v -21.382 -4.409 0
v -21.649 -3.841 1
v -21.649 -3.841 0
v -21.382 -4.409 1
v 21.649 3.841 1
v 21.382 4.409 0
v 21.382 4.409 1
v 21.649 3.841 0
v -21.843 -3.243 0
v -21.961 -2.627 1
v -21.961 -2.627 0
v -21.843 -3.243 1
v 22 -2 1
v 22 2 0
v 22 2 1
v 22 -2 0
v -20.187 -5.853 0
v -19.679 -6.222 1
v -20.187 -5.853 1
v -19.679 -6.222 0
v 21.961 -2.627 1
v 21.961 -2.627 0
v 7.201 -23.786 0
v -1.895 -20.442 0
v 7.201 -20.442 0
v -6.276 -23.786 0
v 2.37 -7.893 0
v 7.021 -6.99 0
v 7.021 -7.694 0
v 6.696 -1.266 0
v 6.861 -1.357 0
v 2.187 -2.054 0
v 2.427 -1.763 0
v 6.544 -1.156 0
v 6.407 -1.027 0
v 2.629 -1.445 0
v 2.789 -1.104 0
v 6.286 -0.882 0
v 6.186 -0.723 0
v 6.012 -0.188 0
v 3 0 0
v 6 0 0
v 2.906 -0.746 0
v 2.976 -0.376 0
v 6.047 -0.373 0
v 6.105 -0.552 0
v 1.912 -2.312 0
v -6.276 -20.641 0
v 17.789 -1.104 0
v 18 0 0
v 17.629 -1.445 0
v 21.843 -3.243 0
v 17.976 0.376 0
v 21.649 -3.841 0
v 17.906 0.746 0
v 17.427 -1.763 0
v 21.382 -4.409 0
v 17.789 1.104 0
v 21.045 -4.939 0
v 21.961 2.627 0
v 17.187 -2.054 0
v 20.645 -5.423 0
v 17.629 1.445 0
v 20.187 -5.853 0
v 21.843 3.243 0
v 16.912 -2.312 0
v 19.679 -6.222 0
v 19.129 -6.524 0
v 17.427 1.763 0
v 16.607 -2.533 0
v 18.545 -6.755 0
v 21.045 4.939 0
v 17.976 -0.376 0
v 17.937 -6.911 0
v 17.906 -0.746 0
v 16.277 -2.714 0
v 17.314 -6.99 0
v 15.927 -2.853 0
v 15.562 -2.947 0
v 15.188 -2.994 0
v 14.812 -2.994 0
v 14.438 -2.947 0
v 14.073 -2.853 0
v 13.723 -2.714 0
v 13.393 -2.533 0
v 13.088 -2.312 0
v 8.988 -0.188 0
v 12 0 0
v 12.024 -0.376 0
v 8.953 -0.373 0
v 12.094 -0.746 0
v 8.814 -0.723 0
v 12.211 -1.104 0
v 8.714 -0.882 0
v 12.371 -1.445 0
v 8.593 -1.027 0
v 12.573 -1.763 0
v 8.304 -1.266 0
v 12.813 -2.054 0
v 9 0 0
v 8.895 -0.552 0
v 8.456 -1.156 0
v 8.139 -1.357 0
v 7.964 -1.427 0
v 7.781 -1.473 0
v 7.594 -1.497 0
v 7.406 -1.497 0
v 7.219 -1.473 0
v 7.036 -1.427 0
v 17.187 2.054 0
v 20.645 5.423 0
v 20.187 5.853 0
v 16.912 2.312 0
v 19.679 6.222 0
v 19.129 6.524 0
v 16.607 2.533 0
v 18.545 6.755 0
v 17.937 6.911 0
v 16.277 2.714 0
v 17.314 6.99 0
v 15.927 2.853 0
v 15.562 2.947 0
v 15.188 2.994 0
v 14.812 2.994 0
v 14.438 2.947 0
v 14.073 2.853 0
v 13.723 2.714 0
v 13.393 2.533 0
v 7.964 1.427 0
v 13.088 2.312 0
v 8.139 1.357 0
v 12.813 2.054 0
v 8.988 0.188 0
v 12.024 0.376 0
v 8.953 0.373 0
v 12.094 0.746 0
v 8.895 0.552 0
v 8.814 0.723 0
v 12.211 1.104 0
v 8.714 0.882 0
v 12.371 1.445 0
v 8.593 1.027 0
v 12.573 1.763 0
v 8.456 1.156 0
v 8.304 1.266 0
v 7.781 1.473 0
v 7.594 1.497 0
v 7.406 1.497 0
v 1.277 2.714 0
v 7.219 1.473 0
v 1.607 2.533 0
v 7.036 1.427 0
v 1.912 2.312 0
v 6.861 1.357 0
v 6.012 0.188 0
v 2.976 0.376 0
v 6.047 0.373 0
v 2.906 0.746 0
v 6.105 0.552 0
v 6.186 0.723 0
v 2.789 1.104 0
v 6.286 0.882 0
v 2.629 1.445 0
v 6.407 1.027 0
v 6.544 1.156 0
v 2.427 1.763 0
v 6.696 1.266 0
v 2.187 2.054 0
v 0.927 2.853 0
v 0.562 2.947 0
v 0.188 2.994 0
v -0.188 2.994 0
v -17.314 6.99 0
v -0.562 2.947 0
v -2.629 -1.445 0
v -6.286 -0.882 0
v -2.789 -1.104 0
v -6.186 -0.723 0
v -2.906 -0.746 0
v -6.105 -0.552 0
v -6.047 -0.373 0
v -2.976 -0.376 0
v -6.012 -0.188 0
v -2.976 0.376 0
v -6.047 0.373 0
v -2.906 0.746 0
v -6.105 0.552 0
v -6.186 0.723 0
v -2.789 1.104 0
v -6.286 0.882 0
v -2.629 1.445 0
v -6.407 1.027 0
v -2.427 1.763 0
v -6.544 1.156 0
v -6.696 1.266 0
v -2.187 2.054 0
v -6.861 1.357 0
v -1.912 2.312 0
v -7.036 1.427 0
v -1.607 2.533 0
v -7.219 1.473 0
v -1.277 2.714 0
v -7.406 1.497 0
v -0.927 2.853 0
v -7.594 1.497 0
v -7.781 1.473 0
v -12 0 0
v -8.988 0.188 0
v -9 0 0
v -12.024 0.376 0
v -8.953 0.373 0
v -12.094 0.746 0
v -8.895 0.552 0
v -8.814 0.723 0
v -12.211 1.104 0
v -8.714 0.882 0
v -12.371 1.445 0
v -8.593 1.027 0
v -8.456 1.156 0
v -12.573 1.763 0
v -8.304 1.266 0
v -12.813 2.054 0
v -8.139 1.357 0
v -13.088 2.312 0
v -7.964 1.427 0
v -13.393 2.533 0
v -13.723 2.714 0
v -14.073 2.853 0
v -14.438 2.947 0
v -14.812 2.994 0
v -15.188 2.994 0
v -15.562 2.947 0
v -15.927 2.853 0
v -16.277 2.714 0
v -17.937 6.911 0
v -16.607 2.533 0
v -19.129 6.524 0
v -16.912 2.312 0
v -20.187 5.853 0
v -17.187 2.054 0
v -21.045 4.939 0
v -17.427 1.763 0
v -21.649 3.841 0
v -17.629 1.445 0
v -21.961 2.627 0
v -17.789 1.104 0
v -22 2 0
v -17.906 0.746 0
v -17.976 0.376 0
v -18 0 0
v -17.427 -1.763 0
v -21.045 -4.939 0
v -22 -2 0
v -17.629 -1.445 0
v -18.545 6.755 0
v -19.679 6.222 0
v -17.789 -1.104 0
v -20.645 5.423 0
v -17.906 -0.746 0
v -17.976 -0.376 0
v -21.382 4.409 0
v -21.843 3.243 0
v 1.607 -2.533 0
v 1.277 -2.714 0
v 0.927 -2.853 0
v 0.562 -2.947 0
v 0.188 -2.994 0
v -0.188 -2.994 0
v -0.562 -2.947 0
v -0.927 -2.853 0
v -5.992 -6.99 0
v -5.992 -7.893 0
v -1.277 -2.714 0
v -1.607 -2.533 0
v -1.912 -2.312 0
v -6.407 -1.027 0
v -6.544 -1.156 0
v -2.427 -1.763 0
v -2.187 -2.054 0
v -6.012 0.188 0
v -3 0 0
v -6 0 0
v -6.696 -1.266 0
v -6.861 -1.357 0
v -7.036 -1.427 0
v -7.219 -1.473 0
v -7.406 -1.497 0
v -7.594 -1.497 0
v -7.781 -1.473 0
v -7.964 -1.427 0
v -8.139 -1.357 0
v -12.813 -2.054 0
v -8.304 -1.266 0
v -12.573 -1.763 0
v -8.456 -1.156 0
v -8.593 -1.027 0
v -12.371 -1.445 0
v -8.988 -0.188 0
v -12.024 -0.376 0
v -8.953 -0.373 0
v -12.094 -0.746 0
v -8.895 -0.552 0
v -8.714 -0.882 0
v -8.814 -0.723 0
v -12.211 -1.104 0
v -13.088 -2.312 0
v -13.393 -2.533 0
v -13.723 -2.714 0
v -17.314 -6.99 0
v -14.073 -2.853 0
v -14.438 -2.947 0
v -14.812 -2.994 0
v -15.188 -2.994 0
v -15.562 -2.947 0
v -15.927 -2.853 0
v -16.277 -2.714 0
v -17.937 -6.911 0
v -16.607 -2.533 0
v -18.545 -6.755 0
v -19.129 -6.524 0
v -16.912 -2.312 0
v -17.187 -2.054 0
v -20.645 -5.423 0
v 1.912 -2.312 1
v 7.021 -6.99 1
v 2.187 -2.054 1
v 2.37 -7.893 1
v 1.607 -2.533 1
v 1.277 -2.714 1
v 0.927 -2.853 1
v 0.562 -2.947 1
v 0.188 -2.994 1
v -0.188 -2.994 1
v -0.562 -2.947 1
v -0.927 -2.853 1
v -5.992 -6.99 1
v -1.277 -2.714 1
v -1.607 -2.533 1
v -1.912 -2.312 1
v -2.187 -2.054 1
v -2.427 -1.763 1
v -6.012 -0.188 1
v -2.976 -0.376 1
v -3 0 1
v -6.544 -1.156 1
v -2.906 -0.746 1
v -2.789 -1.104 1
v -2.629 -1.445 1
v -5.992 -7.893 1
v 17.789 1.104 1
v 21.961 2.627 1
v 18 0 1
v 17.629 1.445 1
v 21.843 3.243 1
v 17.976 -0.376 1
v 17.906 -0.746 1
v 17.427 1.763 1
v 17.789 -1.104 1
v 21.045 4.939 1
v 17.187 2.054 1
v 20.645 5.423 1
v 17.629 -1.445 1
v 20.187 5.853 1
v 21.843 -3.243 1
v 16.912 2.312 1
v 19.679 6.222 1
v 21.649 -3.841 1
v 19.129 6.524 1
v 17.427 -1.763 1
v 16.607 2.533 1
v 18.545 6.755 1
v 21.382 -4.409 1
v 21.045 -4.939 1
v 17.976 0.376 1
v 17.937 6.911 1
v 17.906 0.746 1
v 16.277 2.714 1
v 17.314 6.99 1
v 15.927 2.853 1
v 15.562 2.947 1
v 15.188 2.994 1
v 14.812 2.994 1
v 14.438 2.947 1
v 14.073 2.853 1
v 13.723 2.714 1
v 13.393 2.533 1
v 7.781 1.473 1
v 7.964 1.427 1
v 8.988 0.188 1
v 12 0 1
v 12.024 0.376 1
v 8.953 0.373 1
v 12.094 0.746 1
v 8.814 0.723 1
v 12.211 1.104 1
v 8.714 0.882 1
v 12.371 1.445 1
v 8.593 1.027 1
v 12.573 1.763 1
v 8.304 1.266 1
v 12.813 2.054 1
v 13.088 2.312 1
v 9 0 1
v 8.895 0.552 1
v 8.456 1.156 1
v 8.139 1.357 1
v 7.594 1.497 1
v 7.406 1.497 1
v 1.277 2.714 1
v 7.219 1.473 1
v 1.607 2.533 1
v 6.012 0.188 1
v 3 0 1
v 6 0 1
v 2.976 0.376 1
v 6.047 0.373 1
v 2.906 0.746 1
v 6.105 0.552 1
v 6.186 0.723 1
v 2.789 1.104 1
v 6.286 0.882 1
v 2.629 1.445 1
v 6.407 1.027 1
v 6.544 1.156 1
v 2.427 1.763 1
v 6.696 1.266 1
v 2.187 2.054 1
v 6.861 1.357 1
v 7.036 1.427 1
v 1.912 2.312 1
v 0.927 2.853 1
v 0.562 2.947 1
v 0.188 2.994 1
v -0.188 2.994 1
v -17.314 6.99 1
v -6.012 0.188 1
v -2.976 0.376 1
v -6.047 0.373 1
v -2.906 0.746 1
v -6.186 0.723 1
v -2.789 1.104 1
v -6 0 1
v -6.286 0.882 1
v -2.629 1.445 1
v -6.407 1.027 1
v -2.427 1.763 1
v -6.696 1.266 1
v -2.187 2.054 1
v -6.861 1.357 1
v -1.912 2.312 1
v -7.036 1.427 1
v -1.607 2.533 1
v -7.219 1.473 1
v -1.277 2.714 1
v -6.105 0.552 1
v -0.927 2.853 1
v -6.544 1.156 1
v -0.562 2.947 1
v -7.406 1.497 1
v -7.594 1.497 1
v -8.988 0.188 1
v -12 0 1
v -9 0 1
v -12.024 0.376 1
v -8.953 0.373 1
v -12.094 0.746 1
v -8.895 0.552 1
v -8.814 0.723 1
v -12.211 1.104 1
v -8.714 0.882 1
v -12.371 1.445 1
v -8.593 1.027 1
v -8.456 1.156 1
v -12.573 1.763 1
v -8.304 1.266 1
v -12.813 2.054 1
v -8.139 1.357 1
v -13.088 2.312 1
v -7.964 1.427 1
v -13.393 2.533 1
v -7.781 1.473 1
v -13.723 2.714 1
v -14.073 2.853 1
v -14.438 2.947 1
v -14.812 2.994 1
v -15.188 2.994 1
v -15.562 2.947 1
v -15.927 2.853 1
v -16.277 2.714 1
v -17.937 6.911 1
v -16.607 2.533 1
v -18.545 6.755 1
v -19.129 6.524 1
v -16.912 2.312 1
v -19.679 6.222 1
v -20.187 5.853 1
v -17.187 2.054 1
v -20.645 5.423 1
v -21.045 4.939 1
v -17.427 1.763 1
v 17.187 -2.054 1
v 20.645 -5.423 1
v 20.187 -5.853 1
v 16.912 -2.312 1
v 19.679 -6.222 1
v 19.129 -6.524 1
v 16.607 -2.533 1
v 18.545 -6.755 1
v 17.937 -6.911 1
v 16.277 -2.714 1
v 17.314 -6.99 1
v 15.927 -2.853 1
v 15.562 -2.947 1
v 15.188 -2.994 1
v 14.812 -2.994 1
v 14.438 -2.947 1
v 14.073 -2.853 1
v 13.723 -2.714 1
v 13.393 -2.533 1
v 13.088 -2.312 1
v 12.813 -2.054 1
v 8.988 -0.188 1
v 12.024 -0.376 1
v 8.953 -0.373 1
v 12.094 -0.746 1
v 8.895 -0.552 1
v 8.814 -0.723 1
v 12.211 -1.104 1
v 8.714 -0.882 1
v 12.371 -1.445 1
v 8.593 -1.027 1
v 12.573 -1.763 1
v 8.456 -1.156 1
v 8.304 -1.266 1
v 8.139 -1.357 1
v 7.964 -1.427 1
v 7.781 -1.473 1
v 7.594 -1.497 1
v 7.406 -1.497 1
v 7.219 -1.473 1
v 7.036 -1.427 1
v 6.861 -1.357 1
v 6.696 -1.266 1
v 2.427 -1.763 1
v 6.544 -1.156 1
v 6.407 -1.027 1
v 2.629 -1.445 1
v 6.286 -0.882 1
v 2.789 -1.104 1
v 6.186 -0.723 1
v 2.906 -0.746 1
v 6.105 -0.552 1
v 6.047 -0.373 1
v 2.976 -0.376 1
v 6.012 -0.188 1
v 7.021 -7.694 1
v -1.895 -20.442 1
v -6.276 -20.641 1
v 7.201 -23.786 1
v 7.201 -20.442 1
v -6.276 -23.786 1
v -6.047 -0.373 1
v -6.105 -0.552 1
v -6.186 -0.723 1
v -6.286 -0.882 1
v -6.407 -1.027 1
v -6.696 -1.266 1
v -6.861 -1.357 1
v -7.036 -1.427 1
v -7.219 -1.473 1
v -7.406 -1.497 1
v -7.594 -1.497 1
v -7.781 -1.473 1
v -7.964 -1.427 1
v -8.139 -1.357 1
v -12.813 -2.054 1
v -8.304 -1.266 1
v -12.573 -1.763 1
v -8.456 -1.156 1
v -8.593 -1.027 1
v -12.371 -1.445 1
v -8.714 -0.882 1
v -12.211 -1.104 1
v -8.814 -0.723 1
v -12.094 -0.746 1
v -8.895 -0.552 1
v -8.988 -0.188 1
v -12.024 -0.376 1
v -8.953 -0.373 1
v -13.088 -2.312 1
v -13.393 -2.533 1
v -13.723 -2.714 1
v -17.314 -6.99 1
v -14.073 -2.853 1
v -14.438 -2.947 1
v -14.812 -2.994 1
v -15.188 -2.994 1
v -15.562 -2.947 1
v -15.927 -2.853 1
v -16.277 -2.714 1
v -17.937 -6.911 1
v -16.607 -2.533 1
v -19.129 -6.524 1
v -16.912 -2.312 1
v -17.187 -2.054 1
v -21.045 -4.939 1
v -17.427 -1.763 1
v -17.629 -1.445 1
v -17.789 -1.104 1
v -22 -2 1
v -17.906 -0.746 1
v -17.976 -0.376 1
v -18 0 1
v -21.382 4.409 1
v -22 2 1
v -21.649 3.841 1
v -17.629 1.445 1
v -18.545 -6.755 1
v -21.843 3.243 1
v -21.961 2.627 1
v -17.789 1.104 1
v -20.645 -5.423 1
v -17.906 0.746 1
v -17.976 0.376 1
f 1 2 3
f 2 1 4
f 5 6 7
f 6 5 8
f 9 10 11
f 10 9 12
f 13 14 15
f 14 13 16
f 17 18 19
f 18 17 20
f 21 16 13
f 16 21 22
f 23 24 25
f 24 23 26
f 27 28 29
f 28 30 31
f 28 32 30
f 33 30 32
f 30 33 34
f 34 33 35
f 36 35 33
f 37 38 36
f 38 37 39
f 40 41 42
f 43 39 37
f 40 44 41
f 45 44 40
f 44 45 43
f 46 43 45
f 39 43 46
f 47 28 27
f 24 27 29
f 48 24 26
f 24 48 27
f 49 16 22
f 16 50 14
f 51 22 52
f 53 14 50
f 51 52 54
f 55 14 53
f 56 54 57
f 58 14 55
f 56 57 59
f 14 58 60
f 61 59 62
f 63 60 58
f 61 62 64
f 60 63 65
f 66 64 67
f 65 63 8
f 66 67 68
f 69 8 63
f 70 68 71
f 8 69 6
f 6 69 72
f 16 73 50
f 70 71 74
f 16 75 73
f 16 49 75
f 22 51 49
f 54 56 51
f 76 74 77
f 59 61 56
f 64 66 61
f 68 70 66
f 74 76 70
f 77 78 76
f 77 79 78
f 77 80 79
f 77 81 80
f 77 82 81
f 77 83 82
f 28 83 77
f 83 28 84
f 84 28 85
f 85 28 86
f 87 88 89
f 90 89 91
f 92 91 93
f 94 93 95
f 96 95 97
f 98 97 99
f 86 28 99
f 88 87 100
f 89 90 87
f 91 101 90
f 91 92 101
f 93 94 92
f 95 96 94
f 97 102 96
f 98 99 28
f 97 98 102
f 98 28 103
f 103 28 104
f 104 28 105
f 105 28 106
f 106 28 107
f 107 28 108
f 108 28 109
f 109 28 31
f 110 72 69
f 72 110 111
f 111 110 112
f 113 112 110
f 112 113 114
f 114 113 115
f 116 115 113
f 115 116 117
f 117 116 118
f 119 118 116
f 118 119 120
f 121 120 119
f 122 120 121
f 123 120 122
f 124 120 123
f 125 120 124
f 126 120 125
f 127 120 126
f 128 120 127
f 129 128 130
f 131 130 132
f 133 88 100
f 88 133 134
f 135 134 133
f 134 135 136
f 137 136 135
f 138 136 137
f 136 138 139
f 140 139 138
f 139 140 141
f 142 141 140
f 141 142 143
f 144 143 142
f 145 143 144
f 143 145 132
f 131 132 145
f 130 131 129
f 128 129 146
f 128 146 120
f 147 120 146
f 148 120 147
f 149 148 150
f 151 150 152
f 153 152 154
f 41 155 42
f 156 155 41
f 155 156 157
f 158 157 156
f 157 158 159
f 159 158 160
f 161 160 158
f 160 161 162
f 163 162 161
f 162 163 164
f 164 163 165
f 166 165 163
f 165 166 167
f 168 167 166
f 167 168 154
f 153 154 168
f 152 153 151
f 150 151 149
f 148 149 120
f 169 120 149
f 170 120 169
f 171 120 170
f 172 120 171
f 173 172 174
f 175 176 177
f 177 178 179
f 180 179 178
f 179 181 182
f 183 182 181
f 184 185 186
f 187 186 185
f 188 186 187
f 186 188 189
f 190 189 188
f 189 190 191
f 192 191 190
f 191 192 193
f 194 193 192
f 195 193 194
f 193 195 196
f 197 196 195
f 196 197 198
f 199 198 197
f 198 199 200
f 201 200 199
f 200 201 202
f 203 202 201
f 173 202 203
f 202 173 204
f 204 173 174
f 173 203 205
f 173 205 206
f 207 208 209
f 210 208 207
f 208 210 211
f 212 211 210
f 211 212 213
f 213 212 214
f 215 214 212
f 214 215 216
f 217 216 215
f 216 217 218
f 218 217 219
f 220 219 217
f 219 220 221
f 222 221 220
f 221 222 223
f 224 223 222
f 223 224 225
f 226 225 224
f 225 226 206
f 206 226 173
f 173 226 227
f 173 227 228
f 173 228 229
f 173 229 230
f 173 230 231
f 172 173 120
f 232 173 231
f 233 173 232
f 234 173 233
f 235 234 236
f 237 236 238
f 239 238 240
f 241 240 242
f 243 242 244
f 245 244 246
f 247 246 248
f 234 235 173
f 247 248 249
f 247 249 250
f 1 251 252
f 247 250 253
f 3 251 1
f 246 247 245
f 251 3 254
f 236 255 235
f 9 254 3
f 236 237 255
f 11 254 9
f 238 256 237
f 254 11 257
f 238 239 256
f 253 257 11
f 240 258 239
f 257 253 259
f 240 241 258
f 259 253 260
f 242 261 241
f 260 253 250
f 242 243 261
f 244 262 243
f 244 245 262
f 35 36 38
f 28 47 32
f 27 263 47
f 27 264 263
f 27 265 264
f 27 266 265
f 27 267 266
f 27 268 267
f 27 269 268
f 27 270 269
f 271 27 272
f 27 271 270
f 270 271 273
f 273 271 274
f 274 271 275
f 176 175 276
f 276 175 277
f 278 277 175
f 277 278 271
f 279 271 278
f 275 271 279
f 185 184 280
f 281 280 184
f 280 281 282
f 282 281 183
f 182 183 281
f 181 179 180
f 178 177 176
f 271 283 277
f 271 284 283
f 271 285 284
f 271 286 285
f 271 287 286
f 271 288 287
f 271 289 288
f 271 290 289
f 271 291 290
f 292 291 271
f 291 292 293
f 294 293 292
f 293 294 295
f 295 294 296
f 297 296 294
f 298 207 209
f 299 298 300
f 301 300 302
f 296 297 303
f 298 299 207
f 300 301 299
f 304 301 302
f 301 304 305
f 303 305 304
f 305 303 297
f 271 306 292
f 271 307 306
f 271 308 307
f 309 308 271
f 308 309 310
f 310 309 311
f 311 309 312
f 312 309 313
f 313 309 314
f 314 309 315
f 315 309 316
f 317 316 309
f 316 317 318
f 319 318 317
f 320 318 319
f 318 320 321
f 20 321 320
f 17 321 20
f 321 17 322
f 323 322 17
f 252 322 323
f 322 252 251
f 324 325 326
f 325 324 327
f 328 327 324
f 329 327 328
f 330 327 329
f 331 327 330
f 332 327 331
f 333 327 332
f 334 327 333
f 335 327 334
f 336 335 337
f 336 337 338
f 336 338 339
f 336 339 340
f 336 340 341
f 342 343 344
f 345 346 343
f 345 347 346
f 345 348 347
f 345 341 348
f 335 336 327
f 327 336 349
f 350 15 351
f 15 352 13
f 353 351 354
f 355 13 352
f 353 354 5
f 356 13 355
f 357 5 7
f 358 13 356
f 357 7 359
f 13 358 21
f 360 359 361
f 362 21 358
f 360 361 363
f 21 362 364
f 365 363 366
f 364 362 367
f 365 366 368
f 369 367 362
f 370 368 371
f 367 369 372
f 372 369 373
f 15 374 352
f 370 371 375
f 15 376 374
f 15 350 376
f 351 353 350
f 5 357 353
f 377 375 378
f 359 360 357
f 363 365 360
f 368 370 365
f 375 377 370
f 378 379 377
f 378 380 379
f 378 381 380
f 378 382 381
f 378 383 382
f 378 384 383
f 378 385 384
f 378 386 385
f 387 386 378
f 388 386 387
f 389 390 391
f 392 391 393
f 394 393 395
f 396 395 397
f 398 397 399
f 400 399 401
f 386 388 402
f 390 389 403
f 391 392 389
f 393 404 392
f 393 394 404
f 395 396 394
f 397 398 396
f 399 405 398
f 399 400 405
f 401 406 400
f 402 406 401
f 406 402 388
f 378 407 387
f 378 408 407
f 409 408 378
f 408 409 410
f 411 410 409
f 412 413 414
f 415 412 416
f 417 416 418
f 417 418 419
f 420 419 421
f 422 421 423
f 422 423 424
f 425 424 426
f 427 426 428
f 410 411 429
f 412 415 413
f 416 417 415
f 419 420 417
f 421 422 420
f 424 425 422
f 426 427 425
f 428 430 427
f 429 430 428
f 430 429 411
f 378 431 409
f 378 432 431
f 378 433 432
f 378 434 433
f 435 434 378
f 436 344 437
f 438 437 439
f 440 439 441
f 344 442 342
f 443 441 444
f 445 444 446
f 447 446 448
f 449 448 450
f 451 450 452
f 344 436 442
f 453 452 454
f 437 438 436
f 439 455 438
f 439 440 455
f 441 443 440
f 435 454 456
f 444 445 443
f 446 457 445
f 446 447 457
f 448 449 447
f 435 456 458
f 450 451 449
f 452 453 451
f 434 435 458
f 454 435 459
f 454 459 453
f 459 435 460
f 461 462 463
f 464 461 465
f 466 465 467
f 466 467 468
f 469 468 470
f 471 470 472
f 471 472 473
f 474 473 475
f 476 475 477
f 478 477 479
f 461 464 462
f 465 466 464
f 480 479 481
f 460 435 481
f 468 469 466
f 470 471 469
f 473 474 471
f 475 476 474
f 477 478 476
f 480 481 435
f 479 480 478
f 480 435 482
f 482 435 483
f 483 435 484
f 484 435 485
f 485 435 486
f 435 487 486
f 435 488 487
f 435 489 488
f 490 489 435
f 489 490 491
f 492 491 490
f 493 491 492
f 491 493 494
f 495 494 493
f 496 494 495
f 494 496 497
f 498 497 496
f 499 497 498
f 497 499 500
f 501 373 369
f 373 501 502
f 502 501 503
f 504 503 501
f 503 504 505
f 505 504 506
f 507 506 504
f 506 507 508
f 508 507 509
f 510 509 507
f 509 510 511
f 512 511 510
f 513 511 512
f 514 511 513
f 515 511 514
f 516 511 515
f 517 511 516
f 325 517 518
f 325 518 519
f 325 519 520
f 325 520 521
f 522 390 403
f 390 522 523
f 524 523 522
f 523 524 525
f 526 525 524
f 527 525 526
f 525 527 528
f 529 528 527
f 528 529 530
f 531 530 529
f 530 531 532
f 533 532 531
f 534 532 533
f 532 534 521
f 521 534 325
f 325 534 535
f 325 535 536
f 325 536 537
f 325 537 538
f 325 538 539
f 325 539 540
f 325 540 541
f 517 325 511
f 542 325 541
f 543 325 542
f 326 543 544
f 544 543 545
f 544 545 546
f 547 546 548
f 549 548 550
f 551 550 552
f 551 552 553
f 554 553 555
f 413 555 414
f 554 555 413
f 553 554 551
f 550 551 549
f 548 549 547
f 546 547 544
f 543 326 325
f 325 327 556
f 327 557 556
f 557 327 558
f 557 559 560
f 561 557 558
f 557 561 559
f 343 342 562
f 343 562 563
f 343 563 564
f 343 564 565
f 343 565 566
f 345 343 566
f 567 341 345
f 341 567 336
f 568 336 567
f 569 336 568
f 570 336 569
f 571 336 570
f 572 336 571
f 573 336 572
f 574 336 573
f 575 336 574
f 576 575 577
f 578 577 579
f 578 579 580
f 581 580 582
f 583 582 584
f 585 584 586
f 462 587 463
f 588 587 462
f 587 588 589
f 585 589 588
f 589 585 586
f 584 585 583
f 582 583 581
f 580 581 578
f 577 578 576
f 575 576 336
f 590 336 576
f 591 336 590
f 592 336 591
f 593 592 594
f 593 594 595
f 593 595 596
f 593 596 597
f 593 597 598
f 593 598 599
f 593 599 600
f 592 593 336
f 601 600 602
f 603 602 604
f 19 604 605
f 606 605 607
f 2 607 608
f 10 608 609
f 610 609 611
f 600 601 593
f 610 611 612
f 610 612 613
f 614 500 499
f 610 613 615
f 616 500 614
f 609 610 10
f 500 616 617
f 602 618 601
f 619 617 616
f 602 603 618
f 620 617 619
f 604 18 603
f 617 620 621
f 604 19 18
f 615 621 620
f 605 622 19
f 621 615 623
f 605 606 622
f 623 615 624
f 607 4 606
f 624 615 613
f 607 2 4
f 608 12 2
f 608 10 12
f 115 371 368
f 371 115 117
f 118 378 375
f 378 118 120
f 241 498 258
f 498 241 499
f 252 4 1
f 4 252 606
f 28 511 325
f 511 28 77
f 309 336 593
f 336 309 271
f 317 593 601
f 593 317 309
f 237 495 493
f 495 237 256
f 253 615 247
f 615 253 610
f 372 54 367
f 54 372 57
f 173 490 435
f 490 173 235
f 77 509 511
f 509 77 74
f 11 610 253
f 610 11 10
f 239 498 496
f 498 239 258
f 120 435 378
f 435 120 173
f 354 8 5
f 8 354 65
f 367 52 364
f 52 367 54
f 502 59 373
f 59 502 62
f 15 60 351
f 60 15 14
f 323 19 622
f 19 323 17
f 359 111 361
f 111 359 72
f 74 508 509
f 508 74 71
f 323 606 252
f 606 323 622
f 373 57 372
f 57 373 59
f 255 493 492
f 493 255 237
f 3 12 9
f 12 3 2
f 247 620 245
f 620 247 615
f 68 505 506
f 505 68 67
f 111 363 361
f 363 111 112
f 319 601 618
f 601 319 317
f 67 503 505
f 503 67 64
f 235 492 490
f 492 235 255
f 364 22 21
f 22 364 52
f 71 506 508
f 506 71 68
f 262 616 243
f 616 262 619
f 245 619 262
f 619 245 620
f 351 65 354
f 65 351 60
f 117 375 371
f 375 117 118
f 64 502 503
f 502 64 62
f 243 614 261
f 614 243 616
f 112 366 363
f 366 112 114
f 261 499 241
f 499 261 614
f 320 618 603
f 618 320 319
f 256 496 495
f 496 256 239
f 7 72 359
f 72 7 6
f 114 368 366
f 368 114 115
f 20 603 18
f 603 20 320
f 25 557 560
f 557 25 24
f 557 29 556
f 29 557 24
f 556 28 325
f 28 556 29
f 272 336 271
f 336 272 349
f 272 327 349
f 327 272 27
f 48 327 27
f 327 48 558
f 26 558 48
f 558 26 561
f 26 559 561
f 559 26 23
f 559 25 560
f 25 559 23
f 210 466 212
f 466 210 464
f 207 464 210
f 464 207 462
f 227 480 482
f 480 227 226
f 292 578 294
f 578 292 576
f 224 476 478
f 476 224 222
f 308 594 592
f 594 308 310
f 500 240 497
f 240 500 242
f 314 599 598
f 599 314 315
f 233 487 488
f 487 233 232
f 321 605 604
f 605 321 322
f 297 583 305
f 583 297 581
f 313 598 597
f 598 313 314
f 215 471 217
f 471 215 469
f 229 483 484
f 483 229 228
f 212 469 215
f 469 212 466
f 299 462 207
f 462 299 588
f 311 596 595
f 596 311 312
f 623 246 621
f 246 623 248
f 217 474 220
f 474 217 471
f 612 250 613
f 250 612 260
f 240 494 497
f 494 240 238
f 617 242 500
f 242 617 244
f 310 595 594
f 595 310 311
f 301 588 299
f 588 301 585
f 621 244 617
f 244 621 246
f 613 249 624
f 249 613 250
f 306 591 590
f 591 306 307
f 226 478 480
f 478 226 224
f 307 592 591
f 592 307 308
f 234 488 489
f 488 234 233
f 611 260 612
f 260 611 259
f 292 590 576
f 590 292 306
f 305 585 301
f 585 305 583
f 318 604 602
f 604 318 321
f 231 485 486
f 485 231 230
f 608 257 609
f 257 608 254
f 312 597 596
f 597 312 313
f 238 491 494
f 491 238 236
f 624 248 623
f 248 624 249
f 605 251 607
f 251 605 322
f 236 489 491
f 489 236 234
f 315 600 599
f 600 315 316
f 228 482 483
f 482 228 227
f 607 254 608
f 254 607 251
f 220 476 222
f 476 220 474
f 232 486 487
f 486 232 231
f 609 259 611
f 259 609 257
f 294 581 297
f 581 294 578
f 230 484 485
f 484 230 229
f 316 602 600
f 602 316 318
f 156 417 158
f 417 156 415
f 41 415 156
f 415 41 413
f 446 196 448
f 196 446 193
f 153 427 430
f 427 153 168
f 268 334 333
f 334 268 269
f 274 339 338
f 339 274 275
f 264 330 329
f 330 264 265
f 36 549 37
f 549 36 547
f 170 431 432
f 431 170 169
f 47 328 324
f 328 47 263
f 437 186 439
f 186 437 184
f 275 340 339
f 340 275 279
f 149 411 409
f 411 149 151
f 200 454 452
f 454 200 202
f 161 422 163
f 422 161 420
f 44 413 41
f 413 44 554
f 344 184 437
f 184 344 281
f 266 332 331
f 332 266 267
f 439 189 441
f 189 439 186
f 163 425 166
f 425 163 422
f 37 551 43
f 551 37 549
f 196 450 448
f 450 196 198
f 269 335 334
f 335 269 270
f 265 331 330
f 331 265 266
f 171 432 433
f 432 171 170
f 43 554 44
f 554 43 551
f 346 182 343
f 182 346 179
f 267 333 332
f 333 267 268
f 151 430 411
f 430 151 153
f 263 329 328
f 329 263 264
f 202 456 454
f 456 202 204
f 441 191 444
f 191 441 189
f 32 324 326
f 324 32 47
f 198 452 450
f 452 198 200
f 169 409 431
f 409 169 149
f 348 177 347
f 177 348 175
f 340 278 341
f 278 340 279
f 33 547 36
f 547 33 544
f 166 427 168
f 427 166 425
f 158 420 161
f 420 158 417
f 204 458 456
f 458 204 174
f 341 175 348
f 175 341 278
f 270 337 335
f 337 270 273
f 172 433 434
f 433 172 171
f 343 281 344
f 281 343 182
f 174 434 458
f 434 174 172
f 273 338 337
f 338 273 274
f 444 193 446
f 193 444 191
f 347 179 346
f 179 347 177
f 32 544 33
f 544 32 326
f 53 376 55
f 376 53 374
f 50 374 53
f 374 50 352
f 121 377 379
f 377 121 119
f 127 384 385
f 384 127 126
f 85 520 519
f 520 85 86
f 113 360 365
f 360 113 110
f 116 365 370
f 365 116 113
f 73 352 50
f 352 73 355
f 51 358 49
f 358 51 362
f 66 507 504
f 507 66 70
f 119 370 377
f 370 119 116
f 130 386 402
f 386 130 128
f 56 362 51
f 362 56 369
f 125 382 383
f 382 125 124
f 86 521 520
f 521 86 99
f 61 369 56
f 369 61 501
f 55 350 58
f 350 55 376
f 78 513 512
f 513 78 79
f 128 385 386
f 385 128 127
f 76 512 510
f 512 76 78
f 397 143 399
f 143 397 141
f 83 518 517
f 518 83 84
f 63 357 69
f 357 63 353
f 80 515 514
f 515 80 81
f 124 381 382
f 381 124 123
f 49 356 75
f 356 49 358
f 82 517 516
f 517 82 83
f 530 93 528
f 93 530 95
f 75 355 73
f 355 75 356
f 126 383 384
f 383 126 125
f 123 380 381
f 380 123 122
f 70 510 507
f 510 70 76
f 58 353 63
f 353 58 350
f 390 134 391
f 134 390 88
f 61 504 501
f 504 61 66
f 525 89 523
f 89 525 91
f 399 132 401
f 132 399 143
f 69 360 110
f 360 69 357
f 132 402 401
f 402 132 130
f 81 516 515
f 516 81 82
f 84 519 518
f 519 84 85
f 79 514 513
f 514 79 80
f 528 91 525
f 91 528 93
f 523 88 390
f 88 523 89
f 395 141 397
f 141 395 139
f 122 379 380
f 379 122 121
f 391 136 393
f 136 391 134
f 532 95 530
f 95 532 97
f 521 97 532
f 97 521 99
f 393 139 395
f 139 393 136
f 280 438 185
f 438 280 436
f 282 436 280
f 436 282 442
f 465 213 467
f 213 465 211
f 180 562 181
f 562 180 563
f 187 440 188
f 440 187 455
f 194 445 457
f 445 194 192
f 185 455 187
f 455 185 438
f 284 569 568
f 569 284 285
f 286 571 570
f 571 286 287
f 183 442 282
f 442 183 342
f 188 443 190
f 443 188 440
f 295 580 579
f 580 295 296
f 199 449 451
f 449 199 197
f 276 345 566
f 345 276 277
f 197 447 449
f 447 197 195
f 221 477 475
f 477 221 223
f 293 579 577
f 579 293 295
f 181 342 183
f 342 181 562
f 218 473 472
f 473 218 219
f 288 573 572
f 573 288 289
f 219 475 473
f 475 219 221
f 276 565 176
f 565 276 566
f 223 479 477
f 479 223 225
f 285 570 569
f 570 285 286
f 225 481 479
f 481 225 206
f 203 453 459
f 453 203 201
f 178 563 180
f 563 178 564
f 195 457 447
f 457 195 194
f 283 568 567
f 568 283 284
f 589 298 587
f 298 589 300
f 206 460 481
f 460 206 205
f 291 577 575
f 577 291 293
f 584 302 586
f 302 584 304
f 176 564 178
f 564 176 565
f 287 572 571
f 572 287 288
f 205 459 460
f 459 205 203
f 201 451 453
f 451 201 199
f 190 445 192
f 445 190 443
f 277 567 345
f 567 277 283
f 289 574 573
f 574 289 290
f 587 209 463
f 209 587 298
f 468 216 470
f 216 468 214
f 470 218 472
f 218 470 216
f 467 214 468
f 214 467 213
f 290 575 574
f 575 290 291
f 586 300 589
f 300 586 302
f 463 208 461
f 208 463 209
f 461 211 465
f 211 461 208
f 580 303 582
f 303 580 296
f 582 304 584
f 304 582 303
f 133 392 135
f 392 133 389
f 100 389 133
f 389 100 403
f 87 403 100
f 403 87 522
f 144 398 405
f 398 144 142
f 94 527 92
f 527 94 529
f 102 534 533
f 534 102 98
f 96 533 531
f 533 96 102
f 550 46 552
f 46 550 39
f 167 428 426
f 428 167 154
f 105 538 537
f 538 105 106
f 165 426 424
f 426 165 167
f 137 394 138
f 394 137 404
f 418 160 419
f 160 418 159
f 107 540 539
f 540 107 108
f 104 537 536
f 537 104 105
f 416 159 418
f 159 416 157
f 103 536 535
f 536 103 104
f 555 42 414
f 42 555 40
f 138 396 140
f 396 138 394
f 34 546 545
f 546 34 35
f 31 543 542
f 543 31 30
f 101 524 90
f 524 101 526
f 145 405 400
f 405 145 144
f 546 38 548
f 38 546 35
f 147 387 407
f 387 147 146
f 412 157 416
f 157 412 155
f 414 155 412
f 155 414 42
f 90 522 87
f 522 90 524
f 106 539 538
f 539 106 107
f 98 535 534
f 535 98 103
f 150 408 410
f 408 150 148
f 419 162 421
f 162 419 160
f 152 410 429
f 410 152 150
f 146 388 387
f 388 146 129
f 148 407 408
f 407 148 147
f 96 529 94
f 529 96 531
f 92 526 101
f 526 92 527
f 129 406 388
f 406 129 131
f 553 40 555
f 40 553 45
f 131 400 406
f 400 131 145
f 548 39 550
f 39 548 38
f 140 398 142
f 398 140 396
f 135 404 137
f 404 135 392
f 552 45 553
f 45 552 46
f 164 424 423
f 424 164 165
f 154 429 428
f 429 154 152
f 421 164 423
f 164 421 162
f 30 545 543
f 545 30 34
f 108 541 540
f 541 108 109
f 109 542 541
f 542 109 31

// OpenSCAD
$fn = 50;


difference() {
	union() {
		hull() {
			translate(v = [-17.0000000000, 2.0000000000, 0]) {
				cylinder(h = 1, r = 5);
			}
			translate(v = [17.0000000000, 2.0000000000, 0]) {
				cylinder(h = 1, r = 5);
			}
			translate(v = [-17.0000000000, -2.0000000000, 0]) {
				cylinder(h = 1, r = 5);
			}
			translate(v = [17.0000000000, -2.0000000000, 0]) {
				cylinder(h = 1, r = 5);
			}
		}
		translate(v = [0, -5, 0]) {
			linear_extrude(height = 1) {
				text(font = "DejaVu Sans Mono:style=Bold", halign = "center", size = 19.0000000000, text = "Z", valign = "top");
			}
		}
	}
	union() {
		translate(v = [-15.0000000000, 0.0000000000, 0]) {
			translate(v = [0, 0, -100]) {
				cylinder(h = 200, r = 3.0000000000);
			}
		}
		translate(v = [0, 0, -100]) {
			cylinder(h = 200, r = 3.0000000000);
		}
		translate(v = [15.0000000000, 0.0000000000, 0]) {
			translate(v = [0, 0, -100]) {
				cylinder(h = 200, r = 3.0000000000);
			}
		}
		translate(v = [-15.0000000000, 0.0000000000, 0]) {
			translate(v = [0, 0, -100]) {
				cylinder(h = 200, r = 1.5000000000);
			}
		}
		translate(v = [-7.5000000000, 0.0000000000, 0]) {
			translate(v = [0, 0, -100]) {
				cylinder(h = 200, r = 1.5000000000);
			}
		}
		translate(v = [0, 0, -100]) {
			cylinder(h = 200, r = 1.5000000000);
		}
		translate(v = [7.5000000000, 0.0000000000, 0]) {
			translate(v = [0, 0, -100]) {
				cylinder(h = 200, r = 1.5000000000);
			}
		}
		translate(v = [15.0000000000, 0.0000000000, 0]) {
			translate(v = [0, 0, -100]) {
				cylinder(h = 200, r = 1.5000000000);
			}
		}
	}
}
